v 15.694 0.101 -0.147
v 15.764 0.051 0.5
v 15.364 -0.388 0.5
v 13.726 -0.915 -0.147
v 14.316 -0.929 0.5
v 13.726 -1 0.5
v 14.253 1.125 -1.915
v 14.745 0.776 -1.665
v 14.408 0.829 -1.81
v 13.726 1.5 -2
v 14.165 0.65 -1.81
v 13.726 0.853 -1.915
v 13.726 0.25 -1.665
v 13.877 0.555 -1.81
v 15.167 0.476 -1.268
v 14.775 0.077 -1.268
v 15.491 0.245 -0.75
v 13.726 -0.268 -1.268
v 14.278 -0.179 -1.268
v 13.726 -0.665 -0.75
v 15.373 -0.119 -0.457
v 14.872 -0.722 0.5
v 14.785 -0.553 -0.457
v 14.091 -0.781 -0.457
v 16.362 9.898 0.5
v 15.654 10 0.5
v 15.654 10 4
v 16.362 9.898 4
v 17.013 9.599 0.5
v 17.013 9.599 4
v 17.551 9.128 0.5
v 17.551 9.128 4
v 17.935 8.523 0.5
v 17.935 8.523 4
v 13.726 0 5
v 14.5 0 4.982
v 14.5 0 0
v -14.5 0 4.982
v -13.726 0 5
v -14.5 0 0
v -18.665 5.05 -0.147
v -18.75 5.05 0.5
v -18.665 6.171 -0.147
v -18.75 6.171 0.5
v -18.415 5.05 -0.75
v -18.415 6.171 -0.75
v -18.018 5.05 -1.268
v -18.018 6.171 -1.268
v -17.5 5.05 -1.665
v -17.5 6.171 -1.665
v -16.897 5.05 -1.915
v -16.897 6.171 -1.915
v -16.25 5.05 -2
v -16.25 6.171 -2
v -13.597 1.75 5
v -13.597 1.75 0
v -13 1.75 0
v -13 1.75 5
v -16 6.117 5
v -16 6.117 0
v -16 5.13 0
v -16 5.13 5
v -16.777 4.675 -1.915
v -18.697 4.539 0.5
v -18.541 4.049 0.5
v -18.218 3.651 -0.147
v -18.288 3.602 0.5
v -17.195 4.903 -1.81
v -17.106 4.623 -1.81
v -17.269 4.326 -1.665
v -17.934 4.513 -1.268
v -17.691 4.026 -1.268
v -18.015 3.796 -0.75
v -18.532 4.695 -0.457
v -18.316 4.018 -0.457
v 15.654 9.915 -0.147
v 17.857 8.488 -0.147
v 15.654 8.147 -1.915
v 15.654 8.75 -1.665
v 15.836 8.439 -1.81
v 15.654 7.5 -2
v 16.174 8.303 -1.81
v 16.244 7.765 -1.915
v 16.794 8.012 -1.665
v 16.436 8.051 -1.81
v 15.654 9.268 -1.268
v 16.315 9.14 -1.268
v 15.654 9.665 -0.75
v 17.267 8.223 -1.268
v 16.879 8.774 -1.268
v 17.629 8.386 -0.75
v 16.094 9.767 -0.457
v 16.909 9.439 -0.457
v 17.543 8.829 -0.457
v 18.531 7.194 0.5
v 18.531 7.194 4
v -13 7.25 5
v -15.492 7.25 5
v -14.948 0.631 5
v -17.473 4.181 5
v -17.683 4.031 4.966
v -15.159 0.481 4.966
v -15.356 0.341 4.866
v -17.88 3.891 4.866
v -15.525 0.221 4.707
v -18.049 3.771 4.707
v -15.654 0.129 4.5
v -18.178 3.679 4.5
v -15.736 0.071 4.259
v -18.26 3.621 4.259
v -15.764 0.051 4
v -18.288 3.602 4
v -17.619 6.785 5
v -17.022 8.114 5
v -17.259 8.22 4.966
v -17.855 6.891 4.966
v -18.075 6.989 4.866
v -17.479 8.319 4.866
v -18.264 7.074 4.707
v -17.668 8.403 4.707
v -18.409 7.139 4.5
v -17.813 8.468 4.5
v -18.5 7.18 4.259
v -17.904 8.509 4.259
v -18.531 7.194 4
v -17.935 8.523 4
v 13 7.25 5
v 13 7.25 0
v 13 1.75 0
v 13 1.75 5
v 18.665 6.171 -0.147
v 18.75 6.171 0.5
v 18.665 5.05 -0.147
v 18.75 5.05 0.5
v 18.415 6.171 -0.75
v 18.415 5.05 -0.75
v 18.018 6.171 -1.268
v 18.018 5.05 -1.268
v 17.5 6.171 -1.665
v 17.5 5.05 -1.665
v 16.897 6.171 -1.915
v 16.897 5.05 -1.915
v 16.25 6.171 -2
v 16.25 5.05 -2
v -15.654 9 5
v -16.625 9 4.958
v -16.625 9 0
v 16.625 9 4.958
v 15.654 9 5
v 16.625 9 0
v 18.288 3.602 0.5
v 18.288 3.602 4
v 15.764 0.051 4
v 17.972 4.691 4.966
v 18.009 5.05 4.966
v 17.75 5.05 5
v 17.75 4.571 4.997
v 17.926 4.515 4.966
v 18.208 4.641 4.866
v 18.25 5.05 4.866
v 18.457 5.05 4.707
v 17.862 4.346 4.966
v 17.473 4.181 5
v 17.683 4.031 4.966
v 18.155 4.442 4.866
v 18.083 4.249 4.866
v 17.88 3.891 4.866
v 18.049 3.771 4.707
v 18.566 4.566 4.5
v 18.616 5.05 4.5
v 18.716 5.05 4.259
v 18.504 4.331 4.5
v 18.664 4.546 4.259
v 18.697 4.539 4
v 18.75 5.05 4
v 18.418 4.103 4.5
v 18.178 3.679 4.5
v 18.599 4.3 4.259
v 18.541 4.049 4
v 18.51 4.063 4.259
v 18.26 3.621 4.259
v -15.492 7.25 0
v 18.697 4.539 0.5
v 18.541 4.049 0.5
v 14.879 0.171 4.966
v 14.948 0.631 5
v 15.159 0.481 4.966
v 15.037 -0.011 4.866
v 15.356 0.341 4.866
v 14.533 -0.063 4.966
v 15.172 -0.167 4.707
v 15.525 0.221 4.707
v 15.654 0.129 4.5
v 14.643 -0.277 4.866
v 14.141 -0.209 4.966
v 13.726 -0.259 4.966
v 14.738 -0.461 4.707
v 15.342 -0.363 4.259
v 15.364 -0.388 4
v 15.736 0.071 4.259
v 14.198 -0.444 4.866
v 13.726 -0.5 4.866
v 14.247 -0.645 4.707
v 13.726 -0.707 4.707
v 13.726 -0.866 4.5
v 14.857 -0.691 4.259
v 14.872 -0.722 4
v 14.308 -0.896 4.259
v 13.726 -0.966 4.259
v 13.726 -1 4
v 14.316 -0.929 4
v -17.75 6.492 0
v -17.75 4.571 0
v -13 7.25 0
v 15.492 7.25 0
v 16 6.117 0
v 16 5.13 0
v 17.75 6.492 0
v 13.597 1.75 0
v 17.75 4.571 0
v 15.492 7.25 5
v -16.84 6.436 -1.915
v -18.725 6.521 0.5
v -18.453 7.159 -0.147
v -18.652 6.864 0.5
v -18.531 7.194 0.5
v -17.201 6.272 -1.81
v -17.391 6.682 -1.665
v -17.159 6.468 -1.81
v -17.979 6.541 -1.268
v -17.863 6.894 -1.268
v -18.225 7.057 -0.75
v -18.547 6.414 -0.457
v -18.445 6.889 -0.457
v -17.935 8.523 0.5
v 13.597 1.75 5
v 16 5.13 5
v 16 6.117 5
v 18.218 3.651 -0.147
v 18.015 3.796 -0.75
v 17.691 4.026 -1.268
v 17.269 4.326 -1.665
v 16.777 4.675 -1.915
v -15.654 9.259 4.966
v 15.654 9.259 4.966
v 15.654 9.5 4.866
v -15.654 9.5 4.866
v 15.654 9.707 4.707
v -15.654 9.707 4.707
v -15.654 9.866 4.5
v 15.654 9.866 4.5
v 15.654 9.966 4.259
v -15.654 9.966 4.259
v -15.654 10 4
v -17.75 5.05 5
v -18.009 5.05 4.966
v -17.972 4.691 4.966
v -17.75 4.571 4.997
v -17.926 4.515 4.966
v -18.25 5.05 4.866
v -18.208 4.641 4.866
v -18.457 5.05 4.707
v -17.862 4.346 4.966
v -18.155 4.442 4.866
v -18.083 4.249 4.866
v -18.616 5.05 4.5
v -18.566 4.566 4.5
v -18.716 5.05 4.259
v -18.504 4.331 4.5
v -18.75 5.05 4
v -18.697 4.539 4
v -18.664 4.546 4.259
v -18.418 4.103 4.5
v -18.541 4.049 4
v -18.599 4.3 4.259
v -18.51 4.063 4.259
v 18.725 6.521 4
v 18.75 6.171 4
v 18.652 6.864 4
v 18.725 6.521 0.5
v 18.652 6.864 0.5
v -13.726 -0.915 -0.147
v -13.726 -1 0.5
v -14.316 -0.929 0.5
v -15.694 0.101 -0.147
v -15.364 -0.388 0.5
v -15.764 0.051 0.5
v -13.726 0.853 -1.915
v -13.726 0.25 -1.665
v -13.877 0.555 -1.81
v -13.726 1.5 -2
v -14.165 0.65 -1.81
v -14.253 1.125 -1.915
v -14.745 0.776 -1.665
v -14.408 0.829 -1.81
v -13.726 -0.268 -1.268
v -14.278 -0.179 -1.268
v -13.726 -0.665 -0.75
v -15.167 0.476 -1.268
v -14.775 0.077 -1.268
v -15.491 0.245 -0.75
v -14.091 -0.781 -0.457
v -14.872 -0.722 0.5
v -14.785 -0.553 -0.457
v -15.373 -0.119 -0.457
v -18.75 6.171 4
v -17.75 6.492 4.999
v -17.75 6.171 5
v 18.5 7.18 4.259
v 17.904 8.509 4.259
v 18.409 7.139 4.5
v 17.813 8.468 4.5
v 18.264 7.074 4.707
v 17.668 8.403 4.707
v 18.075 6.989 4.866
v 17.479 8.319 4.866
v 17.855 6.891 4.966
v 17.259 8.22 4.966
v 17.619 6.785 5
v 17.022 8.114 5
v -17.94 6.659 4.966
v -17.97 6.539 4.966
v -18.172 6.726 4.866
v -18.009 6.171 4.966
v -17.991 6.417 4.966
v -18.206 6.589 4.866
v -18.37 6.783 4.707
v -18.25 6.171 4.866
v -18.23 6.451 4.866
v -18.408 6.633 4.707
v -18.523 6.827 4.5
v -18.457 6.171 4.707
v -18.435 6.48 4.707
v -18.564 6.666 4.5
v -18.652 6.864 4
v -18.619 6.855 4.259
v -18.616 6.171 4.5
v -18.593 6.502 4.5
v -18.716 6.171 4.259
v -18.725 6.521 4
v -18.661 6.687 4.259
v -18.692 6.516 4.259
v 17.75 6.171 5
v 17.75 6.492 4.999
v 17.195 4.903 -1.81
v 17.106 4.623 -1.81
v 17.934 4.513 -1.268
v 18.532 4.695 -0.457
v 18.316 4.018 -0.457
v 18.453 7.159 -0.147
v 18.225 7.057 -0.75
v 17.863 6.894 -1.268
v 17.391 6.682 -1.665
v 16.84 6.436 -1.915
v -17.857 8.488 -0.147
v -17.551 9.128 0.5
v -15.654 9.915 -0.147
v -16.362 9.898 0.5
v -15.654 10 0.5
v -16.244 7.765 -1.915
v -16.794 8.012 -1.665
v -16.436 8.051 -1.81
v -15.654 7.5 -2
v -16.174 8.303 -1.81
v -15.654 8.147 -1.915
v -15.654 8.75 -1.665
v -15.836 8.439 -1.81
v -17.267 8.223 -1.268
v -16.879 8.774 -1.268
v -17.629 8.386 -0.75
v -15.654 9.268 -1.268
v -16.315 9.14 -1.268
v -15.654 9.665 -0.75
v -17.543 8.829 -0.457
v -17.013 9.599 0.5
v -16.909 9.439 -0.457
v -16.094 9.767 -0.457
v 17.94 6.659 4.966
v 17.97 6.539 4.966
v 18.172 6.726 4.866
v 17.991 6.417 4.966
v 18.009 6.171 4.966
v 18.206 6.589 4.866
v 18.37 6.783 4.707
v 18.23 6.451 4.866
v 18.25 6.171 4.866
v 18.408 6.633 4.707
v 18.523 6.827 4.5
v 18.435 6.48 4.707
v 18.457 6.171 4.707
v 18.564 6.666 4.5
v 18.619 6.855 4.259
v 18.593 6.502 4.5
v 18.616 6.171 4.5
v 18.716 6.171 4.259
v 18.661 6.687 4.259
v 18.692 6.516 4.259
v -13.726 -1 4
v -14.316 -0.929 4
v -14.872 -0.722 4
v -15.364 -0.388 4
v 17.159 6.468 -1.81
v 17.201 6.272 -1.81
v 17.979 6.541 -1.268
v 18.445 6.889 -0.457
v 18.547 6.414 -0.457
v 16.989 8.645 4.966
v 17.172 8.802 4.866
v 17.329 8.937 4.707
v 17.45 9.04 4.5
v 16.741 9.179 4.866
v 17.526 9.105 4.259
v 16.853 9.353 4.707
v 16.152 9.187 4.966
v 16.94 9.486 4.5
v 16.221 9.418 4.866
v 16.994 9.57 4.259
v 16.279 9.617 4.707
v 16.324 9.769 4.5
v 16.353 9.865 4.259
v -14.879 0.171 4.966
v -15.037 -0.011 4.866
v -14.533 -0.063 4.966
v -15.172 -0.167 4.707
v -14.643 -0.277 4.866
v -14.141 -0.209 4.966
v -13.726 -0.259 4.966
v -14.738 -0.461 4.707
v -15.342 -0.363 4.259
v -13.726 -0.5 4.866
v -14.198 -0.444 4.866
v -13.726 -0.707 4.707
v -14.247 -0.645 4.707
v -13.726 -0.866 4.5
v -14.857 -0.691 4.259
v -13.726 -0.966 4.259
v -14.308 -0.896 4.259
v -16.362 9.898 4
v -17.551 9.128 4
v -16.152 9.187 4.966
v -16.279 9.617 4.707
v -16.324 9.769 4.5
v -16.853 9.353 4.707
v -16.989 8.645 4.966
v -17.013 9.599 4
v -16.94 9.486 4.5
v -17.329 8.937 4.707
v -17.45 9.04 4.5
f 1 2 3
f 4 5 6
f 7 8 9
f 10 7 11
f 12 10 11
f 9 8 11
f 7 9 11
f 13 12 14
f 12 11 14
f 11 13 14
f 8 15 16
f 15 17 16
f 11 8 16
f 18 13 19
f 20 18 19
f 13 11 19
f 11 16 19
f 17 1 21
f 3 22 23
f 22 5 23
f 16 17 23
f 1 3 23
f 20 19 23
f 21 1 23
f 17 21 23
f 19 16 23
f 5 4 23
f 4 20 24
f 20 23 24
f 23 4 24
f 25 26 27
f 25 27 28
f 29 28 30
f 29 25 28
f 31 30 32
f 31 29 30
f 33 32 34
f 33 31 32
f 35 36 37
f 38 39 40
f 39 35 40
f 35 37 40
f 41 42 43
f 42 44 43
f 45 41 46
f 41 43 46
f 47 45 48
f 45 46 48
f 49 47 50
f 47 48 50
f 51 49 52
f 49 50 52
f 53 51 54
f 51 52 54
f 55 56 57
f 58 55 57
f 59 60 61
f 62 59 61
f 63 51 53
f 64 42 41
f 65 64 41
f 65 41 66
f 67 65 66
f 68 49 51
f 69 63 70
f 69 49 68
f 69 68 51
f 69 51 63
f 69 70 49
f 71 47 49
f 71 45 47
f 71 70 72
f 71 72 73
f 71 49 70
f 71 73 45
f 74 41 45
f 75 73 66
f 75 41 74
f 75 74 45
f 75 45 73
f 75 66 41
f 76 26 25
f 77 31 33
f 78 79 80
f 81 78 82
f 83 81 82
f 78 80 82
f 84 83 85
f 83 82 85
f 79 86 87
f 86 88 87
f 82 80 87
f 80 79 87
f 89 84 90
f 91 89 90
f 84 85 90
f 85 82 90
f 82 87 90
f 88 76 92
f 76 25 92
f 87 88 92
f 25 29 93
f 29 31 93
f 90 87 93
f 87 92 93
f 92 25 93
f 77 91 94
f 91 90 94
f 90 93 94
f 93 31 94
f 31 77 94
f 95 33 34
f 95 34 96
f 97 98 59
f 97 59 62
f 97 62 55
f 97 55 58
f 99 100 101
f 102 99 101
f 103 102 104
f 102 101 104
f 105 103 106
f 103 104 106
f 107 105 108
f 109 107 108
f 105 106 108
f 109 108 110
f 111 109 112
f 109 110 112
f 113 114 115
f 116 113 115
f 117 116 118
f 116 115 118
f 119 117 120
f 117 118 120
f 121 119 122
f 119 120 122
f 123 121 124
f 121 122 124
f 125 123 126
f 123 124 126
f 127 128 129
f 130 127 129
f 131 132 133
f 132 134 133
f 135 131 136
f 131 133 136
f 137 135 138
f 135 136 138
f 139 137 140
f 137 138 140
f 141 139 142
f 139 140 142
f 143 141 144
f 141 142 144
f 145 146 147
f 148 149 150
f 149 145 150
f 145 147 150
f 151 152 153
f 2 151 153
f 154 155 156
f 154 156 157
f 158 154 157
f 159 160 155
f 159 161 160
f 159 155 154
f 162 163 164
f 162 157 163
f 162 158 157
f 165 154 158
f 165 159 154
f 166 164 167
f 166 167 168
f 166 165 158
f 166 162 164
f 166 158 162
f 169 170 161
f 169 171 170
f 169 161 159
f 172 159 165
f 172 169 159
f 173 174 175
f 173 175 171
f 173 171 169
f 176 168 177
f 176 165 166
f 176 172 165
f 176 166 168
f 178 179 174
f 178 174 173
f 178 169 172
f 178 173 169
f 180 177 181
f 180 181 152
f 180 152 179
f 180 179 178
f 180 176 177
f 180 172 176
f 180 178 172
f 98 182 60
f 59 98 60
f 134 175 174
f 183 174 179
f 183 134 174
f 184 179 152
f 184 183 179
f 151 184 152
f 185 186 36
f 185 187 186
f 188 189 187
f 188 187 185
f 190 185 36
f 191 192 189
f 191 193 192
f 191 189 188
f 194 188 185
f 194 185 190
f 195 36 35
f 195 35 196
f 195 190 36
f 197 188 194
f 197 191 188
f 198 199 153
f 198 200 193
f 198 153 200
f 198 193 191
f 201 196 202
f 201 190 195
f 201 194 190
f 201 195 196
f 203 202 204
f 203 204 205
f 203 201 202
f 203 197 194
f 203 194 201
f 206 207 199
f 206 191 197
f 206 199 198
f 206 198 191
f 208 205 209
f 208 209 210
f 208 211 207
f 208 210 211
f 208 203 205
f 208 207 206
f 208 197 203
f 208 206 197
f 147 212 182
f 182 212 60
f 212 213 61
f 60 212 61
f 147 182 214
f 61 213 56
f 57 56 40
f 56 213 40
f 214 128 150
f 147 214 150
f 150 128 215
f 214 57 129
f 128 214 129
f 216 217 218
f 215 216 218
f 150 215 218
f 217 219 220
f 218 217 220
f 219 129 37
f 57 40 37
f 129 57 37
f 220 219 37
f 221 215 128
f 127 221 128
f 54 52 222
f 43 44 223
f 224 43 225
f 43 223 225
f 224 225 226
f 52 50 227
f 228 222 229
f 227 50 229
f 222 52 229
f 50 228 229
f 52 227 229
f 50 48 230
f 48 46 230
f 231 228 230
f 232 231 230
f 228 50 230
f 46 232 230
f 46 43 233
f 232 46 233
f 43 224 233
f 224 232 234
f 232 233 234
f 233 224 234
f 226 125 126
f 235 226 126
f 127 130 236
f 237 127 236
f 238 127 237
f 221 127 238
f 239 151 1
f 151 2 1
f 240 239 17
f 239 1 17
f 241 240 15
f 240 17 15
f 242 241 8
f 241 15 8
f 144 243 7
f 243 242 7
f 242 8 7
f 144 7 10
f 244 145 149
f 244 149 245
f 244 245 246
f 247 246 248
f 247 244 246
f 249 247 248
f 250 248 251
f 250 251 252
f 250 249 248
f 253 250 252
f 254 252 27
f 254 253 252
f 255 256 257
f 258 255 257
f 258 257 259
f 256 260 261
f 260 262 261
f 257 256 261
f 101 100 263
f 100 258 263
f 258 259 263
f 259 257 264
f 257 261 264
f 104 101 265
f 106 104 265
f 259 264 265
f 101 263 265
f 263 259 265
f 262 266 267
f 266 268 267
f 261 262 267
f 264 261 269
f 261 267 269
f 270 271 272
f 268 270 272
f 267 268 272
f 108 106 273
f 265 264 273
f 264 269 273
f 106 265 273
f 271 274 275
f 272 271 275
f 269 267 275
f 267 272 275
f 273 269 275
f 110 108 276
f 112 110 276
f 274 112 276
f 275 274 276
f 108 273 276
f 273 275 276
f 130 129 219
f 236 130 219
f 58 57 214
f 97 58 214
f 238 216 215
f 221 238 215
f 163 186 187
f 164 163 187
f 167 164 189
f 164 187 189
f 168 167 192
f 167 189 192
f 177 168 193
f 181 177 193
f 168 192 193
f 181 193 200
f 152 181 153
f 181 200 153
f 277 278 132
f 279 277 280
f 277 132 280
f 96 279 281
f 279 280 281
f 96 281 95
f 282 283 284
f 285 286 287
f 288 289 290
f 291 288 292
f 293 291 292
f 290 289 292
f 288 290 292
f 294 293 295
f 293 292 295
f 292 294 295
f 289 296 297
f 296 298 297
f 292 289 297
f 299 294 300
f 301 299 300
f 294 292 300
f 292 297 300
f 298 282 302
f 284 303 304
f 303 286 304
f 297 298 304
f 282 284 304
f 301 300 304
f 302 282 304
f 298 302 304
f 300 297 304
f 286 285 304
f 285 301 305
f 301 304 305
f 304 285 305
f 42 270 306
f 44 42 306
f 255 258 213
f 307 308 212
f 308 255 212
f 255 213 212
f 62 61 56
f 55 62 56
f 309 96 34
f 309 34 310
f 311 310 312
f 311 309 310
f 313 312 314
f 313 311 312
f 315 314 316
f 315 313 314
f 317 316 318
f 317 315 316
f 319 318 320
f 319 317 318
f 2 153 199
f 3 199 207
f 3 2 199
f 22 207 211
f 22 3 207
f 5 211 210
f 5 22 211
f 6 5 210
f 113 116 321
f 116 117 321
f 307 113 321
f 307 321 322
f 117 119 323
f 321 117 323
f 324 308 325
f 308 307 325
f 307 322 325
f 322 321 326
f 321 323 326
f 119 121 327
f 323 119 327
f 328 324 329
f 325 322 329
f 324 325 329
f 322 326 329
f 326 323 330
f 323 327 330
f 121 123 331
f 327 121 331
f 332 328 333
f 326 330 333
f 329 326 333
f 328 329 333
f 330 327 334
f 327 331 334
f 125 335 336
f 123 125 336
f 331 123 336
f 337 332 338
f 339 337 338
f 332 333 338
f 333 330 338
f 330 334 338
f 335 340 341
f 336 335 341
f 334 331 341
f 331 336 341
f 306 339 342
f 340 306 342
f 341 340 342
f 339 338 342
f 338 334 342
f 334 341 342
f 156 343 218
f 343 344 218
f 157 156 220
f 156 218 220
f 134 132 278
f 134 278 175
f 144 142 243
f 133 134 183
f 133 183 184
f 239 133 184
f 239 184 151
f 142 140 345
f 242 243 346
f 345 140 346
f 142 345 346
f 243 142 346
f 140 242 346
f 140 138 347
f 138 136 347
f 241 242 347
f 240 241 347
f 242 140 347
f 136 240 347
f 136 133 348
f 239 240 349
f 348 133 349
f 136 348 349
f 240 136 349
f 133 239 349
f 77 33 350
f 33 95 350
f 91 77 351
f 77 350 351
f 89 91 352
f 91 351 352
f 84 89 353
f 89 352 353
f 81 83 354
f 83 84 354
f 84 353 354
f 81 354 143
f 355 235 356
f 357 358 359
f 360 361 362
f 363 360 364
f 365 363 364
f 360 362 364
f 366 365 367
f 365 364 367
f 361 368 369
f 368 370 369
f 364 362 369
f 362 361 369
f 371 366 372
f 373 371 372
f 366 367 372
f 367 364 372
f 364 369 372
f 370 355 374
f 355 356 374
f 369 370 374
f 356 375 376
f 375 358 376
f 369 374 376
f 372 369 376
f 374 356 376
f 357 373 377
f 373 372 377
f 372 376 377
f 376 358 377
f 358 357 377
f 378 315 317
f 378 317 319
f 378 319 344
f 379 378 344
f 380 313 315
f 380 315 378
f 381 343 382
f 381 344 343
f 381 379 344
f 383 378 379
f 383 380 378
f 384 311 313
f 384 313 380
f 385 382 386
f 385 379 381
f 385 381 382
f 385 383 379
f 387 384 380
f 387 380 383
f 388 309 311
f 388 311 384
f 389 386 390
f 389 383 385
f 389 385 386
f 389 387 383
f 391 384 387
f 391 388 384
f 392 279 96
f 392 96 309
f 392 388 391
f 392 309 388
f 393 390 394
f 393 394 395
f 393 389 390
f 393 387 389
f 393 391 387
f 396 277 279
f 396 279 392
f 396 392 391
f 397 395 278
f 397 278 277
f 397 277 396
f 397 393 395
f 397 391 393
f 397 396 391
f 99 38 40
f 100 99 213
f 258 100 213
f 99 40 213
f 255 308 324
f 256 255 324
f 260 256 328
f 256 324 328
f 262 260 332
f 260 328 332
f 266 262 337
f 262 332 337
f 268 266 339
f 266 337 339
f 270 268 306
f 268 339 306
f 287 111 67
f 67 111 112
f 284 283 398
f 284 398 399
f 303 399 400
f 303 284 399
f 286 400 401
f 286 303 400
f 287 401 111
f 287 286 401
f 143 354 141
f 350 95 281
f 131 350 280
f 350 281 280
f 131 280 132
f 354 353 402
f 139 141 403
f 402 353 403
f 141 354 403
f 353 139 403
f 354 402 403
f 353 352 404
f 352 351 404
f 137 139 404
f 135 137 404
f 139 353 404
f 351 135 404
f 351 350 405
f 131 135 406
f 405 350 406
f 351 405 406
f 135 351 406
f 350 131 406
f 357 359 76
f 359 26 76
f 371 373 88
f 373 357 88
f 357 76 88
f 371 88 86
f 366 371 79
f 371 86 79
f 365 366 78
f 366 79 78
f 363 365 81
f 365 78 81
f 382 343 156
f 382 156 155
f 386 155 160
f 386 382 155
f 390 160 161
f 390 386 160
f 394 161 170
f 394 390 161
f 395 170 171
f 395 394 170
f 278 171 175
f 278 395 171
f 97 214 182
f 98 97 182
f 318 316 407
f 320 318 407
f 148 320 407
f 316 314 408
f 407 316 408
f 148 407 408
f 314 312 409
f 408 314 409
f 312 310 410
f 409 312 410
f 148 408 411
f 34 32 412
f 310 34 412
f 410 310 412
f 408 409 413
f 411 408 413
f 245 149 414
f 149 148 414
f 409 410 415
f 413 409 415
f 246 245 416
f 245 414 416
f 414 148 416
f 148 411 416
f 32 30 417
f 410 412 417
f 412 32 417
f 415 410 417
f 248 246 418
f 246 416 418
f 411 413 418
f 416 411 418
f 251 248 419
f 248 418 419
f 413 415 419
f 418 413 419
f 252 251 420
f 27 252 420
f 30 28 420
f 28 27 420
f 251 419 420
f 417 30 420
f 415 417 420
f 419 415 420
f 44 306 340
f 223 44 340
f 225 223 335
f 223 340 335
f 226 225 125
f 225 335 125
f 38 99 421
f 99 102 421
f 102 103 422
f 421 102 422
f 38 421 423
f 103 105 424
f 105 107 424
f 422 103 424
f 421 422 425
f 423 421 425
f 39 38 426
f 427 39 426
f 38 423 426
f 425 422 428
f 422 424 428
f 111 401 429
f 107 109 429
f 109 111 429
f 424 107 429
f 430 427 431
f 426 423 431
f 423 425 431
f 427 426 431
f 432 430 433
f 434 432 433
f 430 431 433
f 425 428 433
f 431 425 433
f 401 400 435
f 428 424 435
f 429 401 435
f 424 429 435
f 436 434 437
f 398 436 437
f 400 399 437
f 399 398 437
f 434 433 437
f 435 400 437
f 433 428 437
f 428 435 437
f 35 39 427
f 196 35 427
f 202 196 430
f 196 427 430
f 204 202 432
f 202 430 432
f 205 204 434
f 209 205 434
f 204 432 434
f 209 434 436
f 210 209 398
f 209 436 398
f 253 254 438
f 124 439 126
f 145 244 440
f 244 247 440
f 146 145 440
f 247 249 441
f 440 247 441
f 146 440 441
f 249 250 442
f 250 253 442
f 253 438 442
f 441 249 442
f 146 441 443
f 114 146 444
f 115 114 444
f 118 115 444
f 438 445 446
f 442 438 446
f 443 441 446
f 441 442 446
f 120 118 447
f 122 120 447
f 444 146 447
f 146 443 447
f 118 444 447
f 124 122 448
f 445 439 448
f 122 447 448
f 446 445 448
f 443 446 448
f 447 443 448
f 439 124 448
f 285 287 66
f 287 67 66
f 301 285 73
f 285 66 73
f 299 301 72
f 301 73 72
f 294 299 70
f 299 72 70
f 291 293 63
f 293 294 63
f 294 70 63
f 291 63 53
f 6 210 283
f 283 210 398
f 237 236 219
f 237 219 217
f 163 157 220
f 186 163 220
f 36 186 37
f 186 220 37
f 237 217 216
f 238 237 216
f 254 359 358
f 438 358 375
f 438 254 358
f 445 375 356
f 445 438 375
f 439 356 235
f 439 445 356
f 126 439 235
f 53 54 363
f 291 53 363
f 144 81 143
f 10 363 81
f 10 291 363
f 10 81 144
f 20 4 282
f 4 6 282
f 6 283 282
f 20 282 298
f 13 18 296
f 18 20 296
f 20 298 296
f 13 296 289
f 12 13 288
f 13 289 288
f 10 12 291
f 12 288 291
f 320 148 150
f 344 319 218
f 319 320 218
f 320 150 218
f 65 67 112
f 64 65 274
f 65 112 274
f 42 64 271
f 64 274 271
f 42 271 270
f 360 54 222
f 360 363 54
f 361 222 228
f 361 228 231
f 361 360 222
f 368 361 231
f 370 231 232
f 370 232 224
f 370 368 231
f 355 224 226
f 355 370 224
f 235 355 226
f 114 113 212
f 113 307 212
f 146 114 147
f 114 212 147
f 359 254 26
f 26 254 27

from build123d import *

# Parameters (mm, degrees)
F1_DEPTH     = 5
F3_DEPTH     = 2
F4_R         = 2.5
F5_T1_DEPTH  = 27.4519311484
F5_T3_DEPTH  = 1.45667481
F5_T5_DEPTH  = 1.1206167057
F5_T7_DEPTH  = 31.3076734299
F5_T9_DEPTH  = 4.3560651868
F5_T11_DEPTH = 1.45667481
F5_T13_DEPTH = 4.3560651868
F5_T16_ANGLE = 24.1585538769
F5_T18_ANGLE = 65.8414461231
F5_T20_ANGLE = 35.4104549915
F5_T22_ANGLE = 65.8414461231
F5_T24_ANGLE = 54.5895450085
F5_T26_ANGLE = 24.1585538769
F5_T28_ANGLE = 54.5895450085
F5_T30_ANGLE = 35.4104549915


# Not quite as in the source:
# - a fillet or chamfer that OpenCascade refuses, or shapes differently, is made with other operations: its cross-section is extruded or revolved along the edge and cut away or added


with BuildPart() as f1:
    # F0 (on Top) → F1 (new body)
    with BuildSketch(Plane.XY):
        Polygon((18.75, 6.7059138706), (17.27244219, 10), (0, 10), (-17.27244219, 10), (-18.75, 6.7059138706), (-18.75, 4.2521861975), (-15.0160229505, -1), (0, -1), (15.0160229505, -1), (18.75, 4.2521861975), align=None)
        Polygon((14.5, 0), (0, 0), (-14.5, 0), (-17.75, 4.5714274394), (-17.75, 6.4919107255), (-16.625, 9), (0, 9), (16.625, 9), (17.75, 6.4919107255), (17.75, 4.5714274394), align=None, mode=Mode.SUBTRACT)
    extrude(amount=F1_DEPTH)



with BuildPart() as f1b:
    # F0 (on Top) → F1, piece 2 (new body)
    with BuildSketch(Plane.XY):
        Polygon((-15.4919761674, 7.25), (-16, 6.1174052217), (-16, 5.1300996126), (-13.5969598365, 1.75), (-13, 1.75), (-13, 7.25), align=None)
    extrude(amount=F1_DEPTH)


with BuildPart() as f1c:
    # F0 (on Top) → F1, piece 3 (new body)
    with BuildSketch(Plane.XY):
        Polygon((16, 6.1174052217), (15.4919761674, 7.25), (13, 7.25), (13, 1.75), (13.5969598365, 1.75), (16, 5.1300996126), align=None)
    extrude(amount=F1_DEPTH)


with BuildPart() as f1_1:
    add(f1.part)

    add(f1b.part)  # F3 merges F1b

    add(f1c.part)  # F3 merges F1c
    # F2 (on face) → F3 (join)
    with BuildSketch(Plane(origin=(0, 0, 0), x_dir=(1, 0, 0), z_dir=(0, 0, -1))):
        Polygon((-17.27244219, -10), (17.27244219, -10), (18.75, -6.7059138706), (18.75, -4.2521861975), (15.0160229505, 1), (-15.0160229505, 1), (-18.75, -4.2521861975), (-18.75, -6.7059138706), align=None)
    extrude(amount=F3_DEPTH)

    # F4
    f4_edges = [f1_1.edges().sort_by_distance(p)[0] for p in [
        (-18.75, 5.47905, -2),
        (-18.011221, 8.352957, -2),
        (0, 10, -2),
        (18.011221, 8.352957, -2),
        (18.75, 5.47905, -2),
        (16.883011, 1.626093, -2),
        (0, -1, -2),
        (-16.883011, 1.626093, -2),
        (-15.016023, -1, 1.5),
        (-18.75, 4.252186, 1.5),
        (-18.75, 6.705914, 1.5),
        (-17.272442, 10, 1.5),
        (15.016023, -1, 1.5),
        (18.75, 4.252186, 1.5),
        (17.272442, 10, 1.5),
        (18.75, 6.705914, 1.5),
    ]]
    fillet(f4_edges, radius=F4_R)

    # F5: fillet of radius 1 on 16 edges, made by hand

    # F5_s2 → F5_t1 (cut)
    with BuildSketch(Plane.YZ.offset(-13.7259655742)):
        with BuildLine():
            ThreePointArc((0, 5), (-0.7071067812, 4.7071067812), (-1, 4))
            Line((-1, 4), (-1, 5))
            Line((-1, 5), (0, 5))
        make_face()
    extrude(amount=F5_T1_DEPTH, mode=Mode.SUBTRACT)

    # F5_s4 → F5_t3 (cut)
    with BuildSketch(Plane(origin=(0.417485186, -0.9307467709, 0), x_dir=(0, 0, 1), z_dir=(-0.4092631251, 0.9124164041, 0))):
        with BuildLine():
            ThreePointArc((4, 19.8522908438), (4.7071067812, 19.5593976249), (5, 18.8522908438))
            Line((5, 18.8522908438), (5, 19.8522908438))
            Line((5, 19.8522908438), (4, 19.8522908438))
        make_face()
    extrude(amount=F5_T3_DEPTH, mode=Mode.SUBTRACT)

    # F5_s6 → F5_t5 (cut)
    with BuildSketch(Plane.XZ.offset(-6.1709060079)):
        with BuildLine():
            ThreePointArc((17.75, 5), (18.4571067812, 4.7071067812), (18.75, 4))
            Line((18.75, 4), (18.75, 5))
            Line((18.75, 5), (17.75, 5))
        make_face()
        with BuildLine():
            ThreePointArc((-17.75, 5), (-18.4571067812, 4.7071067812), (-18.75, 4))
            Line((-18.75, 4), (-18.75, 5))
            Line((-18.75, 5), (-17.75, 5))
        make_face()
    extrude(amount=F5_T5_DEPTH, mode=Mode.SUBTRACT)

    # F5_s8 → F5_t7 (cut)
    with BuildSketch(Plane.YZ.offset(-15.6538367149)):
        with BuildLine():
            ThreePointArc((9, 5), (9.7071067812, 4.7071067812), (10, 4))
            Line((10, 4), (10, 5))
            Line((10, 5), (9, 5))
        make_face()
    extrude(amount=F5_T7_DEPTH, mode=Mode.SUBTRACT)

    # F5_s10 → F5_t9 (cut)
    with BuildSketch(Plane(origin=(5.3167143619, 7.4784535142, 0), x_dir=(0, 0, 1), z_dir=(0.5794299023, 0.8150220784, 0))):
        with BuildLine():
            ThreePointArc((5, 11.8178201367), (4.7071067812, 12.5249269179), (4, 12.8178201367))
            Line((4, 12.8178201367), (5, 12.8178201367))
            Line((5, 12.8178201367), (5, 11.8178201367))
        make_face()
    extrude(amount=F5_T9_DEPTH, mode=Mode.SUBTRACT)

    # F5_s12 → F5_t11 (cut)
    with BuildSketch(Plane(origin=(0.1786780991, 0.3983472212, 0), x_dir=(0, 0, 1), z_dir=(-0.4092631251, -0.9124164041, 0))):
        with BuildLine():
            ThreePointArc((5, 18.8522908438), (4.7071067812, 19.5593976249), (4, 19.8522908438))
            Line((4, 19.8522908438), (5, 19.8522908438))
            Line((5, 19.8522908438), (5, 18.8522908438))
        make_face()
    extrude(amount=F5_T11_DEPTH, mode=Mode.SUBTRACT)

    # F5_s14 → F5_t13 (cut)
    with BuildSketch(Plane(origin=(-7.8407487877, 11.0287428164, 0), x_dir=(0, 0, 1), z_dir=(0.5794299023, -0.8150220784, 0))):
        with BuildLine():
            ThreePointArc((5, 11.8178201367), (4.7071067812, 12.5249269179), (4, 12.8178201367))
            Line((4, 12.8178201367), (5, 12.8178201367))
            Line((5, 12.8178201367), (5, 11.8178201367))
        make_face()
    extrude(amount=F5_T13_DEPTH, mode=Mode.SUBTRACT)

    # F5_s15 → F5_t16 (revolve, cut)
    with BuildSketch(Plane(origin=(0.417485186, -0.9307467709, 0), x_dir=(0, 0, 1), z_dir=(-0.4092631251, 0.9124164041, 0))):
        with BuildLine():
            ThreePointArc((5, 18.8522908438), (4.7071067812, 19.5593976249), (4, 19.8522908438))
            Line((4, 19.8522908438), (5, 19.8522908438))
            Line((5, 19.8522908438), (5, 18.8522908438))
        make_face()
    revolve(axis=Axis((16.25, 6.1709060079, 5), (0, 0, -1)), revolution_arc=F5_T16_ANGLE, mode=Mode.SUBTRACT)

    # F5_s17 → F5_t18 (revolve, cut)
    with BuildSketch(Plane(origin=(-0.1786780991, 0.3983472212, 0), x_dir=(0, 0, 1), z_dir=(0.4092631251, -0.9124164041, 0))):
        with BuildLine():
            ThreePointArc((5, -18.8522908438), (4.7071067812, -19.5593976249), (4, -19.8522908438))
            Line((4, -19.8522908438), (5, -19.8522908438))
            Line((5, -19.8522908438), (5, -18.8522908438))
        make_face()
    revolve(axis=Axis((15.6538367149, 7.5, 5), (0, 0, 1)), revolution_arc=F5_T18_ANGLE, mode=Mode.SUBTRACT)

    # F5_s19 → F5_t20 (revolve, cut)
    with BuildSketch(Plane.XZ.offset(-5.0502893022)):
        with BuildLine():
            ThreePointArc((17.75, 5), (18.4571067812, 4.7071067812), (18.75, 4))
            Line((18.75, 4), (18.75, 5))
            Line((18.75, 5), (17.75, 5))
        make_face()
    revolve(axis=Axis((16.25, 5.0502893022, 5), (0, 0, -1)), revolution_arc=F5_T20_ANGLE, mode=Mode.SUBTRACT)

    # F5_s21 → F5_t22 (revolve, cut)
    with BuildSketch(Plane.YZ.offset(-15.6538367149)):
        with BuildLine():
            ThreePointArc((9, 5), (9.7071067812, 4.7071067812), (10, 4))
            Line((10, 4), (10, 5))
            Line((10, 5), (9, 5))
        make_face()
    revolve(axis=Axis((-15.6538367149, 7.5, 5), (0, 0, 1)), revolution_arc=F5_T22_ANGLE, mode=Mode.SUBTRACT)

    # F5_s23 → F5_t24 (revolve, cut)
    with BuildSketch(Plane(origin=(5.3167143619, 7.4784535142, 0), x_dir=(0, 0, 1), z_dir=(0.5794299023, 0.8150220784, 0))):
        with BuildLine():
            ThreePointArc((5, 11.8178201367), (4.7071067812, 12.5249269179), (4, 12.8178201367))
            Line((4, 12.8178201367), (5, 12.8178201367))
            Line((5, 12.8178201367), (5, 11.8178201367))
        make_face()
    revolve(axis=Axis((13.7259655742, 1.5, 5), (0, 0, -1)), revolution_arc=F5_T24_ANGLE, mode=Mode.SUBTRACT)

    # F5_s25 → F5_t26 (revolve, cut)
    with BuildSketch(Plane(origin=(-0.417485186, -0.9307467709, 0), x_dir=(0, 0, 1), z_dir=(0.4092631251, 0.9124164041, 0))):
        with BuildLine():
            ThreePointArc((5, -18.8522908438), (4.7071067812, -19.5593976249), (4, -19.8522908438))
            Line((4, -19.8522908438), (5, -19.8522908438))
            Line((5, -19.8522908438), (5, -18.8522908438))
        make_face()
    revolve(axis=Axis((-16.25, 6.1709060079, 5), (0, 0, 1)), revolution_arc=F5_T26_ANGLE, mode=Mode.SUBTRACT)

    # F5_s27 → F5_t28 (revolve, cut)
    with BuildSketch(Plane(origin=(-5.3167143619, 7.4784535142, 0), x_dir=(0, 0, 1), z_dir=(-0.5794299023, 0.8150220784, 0))):
        with BuildLine():
            ThreePointArc((5, -11.8178201367), (4.7071067812, -12.5249269179), (4, -12.8178201367))
            Line((4, -12.8178201367), (5, -12.8178201367))
            Line((5, -12.8178201367), (5, -11.8178201367))
        make_face()
    revolve(axis=Axis((-13.7259655742, 1.5, 5), (0, 0, 1)), revolution_arc=F5_T28_ANGLE, mode=Mode.SUBTRACT)

    # F5_s29 → F5_t30 (revolve, cut)
    with BuildSketch(Plane.XZ.offset(-5.0502893022)):
        with BuildLine():
            ThreePointArc((-17.75, 5), (-18.4571067812, 4.7071067812), (-18.75, 4))
            Line((-18.75, 4), (-18.75, 5))
            Line((-18.75, 5), (-17.75, 5))
        make_face()
    revolve(axis=Axis((-16.25, 5.0502893022, 5), (0, 0, 1)), revolution_arc=F5_T30_ANGLE, mode=Mode.SUBTRACT)


solid = f1_1.part
